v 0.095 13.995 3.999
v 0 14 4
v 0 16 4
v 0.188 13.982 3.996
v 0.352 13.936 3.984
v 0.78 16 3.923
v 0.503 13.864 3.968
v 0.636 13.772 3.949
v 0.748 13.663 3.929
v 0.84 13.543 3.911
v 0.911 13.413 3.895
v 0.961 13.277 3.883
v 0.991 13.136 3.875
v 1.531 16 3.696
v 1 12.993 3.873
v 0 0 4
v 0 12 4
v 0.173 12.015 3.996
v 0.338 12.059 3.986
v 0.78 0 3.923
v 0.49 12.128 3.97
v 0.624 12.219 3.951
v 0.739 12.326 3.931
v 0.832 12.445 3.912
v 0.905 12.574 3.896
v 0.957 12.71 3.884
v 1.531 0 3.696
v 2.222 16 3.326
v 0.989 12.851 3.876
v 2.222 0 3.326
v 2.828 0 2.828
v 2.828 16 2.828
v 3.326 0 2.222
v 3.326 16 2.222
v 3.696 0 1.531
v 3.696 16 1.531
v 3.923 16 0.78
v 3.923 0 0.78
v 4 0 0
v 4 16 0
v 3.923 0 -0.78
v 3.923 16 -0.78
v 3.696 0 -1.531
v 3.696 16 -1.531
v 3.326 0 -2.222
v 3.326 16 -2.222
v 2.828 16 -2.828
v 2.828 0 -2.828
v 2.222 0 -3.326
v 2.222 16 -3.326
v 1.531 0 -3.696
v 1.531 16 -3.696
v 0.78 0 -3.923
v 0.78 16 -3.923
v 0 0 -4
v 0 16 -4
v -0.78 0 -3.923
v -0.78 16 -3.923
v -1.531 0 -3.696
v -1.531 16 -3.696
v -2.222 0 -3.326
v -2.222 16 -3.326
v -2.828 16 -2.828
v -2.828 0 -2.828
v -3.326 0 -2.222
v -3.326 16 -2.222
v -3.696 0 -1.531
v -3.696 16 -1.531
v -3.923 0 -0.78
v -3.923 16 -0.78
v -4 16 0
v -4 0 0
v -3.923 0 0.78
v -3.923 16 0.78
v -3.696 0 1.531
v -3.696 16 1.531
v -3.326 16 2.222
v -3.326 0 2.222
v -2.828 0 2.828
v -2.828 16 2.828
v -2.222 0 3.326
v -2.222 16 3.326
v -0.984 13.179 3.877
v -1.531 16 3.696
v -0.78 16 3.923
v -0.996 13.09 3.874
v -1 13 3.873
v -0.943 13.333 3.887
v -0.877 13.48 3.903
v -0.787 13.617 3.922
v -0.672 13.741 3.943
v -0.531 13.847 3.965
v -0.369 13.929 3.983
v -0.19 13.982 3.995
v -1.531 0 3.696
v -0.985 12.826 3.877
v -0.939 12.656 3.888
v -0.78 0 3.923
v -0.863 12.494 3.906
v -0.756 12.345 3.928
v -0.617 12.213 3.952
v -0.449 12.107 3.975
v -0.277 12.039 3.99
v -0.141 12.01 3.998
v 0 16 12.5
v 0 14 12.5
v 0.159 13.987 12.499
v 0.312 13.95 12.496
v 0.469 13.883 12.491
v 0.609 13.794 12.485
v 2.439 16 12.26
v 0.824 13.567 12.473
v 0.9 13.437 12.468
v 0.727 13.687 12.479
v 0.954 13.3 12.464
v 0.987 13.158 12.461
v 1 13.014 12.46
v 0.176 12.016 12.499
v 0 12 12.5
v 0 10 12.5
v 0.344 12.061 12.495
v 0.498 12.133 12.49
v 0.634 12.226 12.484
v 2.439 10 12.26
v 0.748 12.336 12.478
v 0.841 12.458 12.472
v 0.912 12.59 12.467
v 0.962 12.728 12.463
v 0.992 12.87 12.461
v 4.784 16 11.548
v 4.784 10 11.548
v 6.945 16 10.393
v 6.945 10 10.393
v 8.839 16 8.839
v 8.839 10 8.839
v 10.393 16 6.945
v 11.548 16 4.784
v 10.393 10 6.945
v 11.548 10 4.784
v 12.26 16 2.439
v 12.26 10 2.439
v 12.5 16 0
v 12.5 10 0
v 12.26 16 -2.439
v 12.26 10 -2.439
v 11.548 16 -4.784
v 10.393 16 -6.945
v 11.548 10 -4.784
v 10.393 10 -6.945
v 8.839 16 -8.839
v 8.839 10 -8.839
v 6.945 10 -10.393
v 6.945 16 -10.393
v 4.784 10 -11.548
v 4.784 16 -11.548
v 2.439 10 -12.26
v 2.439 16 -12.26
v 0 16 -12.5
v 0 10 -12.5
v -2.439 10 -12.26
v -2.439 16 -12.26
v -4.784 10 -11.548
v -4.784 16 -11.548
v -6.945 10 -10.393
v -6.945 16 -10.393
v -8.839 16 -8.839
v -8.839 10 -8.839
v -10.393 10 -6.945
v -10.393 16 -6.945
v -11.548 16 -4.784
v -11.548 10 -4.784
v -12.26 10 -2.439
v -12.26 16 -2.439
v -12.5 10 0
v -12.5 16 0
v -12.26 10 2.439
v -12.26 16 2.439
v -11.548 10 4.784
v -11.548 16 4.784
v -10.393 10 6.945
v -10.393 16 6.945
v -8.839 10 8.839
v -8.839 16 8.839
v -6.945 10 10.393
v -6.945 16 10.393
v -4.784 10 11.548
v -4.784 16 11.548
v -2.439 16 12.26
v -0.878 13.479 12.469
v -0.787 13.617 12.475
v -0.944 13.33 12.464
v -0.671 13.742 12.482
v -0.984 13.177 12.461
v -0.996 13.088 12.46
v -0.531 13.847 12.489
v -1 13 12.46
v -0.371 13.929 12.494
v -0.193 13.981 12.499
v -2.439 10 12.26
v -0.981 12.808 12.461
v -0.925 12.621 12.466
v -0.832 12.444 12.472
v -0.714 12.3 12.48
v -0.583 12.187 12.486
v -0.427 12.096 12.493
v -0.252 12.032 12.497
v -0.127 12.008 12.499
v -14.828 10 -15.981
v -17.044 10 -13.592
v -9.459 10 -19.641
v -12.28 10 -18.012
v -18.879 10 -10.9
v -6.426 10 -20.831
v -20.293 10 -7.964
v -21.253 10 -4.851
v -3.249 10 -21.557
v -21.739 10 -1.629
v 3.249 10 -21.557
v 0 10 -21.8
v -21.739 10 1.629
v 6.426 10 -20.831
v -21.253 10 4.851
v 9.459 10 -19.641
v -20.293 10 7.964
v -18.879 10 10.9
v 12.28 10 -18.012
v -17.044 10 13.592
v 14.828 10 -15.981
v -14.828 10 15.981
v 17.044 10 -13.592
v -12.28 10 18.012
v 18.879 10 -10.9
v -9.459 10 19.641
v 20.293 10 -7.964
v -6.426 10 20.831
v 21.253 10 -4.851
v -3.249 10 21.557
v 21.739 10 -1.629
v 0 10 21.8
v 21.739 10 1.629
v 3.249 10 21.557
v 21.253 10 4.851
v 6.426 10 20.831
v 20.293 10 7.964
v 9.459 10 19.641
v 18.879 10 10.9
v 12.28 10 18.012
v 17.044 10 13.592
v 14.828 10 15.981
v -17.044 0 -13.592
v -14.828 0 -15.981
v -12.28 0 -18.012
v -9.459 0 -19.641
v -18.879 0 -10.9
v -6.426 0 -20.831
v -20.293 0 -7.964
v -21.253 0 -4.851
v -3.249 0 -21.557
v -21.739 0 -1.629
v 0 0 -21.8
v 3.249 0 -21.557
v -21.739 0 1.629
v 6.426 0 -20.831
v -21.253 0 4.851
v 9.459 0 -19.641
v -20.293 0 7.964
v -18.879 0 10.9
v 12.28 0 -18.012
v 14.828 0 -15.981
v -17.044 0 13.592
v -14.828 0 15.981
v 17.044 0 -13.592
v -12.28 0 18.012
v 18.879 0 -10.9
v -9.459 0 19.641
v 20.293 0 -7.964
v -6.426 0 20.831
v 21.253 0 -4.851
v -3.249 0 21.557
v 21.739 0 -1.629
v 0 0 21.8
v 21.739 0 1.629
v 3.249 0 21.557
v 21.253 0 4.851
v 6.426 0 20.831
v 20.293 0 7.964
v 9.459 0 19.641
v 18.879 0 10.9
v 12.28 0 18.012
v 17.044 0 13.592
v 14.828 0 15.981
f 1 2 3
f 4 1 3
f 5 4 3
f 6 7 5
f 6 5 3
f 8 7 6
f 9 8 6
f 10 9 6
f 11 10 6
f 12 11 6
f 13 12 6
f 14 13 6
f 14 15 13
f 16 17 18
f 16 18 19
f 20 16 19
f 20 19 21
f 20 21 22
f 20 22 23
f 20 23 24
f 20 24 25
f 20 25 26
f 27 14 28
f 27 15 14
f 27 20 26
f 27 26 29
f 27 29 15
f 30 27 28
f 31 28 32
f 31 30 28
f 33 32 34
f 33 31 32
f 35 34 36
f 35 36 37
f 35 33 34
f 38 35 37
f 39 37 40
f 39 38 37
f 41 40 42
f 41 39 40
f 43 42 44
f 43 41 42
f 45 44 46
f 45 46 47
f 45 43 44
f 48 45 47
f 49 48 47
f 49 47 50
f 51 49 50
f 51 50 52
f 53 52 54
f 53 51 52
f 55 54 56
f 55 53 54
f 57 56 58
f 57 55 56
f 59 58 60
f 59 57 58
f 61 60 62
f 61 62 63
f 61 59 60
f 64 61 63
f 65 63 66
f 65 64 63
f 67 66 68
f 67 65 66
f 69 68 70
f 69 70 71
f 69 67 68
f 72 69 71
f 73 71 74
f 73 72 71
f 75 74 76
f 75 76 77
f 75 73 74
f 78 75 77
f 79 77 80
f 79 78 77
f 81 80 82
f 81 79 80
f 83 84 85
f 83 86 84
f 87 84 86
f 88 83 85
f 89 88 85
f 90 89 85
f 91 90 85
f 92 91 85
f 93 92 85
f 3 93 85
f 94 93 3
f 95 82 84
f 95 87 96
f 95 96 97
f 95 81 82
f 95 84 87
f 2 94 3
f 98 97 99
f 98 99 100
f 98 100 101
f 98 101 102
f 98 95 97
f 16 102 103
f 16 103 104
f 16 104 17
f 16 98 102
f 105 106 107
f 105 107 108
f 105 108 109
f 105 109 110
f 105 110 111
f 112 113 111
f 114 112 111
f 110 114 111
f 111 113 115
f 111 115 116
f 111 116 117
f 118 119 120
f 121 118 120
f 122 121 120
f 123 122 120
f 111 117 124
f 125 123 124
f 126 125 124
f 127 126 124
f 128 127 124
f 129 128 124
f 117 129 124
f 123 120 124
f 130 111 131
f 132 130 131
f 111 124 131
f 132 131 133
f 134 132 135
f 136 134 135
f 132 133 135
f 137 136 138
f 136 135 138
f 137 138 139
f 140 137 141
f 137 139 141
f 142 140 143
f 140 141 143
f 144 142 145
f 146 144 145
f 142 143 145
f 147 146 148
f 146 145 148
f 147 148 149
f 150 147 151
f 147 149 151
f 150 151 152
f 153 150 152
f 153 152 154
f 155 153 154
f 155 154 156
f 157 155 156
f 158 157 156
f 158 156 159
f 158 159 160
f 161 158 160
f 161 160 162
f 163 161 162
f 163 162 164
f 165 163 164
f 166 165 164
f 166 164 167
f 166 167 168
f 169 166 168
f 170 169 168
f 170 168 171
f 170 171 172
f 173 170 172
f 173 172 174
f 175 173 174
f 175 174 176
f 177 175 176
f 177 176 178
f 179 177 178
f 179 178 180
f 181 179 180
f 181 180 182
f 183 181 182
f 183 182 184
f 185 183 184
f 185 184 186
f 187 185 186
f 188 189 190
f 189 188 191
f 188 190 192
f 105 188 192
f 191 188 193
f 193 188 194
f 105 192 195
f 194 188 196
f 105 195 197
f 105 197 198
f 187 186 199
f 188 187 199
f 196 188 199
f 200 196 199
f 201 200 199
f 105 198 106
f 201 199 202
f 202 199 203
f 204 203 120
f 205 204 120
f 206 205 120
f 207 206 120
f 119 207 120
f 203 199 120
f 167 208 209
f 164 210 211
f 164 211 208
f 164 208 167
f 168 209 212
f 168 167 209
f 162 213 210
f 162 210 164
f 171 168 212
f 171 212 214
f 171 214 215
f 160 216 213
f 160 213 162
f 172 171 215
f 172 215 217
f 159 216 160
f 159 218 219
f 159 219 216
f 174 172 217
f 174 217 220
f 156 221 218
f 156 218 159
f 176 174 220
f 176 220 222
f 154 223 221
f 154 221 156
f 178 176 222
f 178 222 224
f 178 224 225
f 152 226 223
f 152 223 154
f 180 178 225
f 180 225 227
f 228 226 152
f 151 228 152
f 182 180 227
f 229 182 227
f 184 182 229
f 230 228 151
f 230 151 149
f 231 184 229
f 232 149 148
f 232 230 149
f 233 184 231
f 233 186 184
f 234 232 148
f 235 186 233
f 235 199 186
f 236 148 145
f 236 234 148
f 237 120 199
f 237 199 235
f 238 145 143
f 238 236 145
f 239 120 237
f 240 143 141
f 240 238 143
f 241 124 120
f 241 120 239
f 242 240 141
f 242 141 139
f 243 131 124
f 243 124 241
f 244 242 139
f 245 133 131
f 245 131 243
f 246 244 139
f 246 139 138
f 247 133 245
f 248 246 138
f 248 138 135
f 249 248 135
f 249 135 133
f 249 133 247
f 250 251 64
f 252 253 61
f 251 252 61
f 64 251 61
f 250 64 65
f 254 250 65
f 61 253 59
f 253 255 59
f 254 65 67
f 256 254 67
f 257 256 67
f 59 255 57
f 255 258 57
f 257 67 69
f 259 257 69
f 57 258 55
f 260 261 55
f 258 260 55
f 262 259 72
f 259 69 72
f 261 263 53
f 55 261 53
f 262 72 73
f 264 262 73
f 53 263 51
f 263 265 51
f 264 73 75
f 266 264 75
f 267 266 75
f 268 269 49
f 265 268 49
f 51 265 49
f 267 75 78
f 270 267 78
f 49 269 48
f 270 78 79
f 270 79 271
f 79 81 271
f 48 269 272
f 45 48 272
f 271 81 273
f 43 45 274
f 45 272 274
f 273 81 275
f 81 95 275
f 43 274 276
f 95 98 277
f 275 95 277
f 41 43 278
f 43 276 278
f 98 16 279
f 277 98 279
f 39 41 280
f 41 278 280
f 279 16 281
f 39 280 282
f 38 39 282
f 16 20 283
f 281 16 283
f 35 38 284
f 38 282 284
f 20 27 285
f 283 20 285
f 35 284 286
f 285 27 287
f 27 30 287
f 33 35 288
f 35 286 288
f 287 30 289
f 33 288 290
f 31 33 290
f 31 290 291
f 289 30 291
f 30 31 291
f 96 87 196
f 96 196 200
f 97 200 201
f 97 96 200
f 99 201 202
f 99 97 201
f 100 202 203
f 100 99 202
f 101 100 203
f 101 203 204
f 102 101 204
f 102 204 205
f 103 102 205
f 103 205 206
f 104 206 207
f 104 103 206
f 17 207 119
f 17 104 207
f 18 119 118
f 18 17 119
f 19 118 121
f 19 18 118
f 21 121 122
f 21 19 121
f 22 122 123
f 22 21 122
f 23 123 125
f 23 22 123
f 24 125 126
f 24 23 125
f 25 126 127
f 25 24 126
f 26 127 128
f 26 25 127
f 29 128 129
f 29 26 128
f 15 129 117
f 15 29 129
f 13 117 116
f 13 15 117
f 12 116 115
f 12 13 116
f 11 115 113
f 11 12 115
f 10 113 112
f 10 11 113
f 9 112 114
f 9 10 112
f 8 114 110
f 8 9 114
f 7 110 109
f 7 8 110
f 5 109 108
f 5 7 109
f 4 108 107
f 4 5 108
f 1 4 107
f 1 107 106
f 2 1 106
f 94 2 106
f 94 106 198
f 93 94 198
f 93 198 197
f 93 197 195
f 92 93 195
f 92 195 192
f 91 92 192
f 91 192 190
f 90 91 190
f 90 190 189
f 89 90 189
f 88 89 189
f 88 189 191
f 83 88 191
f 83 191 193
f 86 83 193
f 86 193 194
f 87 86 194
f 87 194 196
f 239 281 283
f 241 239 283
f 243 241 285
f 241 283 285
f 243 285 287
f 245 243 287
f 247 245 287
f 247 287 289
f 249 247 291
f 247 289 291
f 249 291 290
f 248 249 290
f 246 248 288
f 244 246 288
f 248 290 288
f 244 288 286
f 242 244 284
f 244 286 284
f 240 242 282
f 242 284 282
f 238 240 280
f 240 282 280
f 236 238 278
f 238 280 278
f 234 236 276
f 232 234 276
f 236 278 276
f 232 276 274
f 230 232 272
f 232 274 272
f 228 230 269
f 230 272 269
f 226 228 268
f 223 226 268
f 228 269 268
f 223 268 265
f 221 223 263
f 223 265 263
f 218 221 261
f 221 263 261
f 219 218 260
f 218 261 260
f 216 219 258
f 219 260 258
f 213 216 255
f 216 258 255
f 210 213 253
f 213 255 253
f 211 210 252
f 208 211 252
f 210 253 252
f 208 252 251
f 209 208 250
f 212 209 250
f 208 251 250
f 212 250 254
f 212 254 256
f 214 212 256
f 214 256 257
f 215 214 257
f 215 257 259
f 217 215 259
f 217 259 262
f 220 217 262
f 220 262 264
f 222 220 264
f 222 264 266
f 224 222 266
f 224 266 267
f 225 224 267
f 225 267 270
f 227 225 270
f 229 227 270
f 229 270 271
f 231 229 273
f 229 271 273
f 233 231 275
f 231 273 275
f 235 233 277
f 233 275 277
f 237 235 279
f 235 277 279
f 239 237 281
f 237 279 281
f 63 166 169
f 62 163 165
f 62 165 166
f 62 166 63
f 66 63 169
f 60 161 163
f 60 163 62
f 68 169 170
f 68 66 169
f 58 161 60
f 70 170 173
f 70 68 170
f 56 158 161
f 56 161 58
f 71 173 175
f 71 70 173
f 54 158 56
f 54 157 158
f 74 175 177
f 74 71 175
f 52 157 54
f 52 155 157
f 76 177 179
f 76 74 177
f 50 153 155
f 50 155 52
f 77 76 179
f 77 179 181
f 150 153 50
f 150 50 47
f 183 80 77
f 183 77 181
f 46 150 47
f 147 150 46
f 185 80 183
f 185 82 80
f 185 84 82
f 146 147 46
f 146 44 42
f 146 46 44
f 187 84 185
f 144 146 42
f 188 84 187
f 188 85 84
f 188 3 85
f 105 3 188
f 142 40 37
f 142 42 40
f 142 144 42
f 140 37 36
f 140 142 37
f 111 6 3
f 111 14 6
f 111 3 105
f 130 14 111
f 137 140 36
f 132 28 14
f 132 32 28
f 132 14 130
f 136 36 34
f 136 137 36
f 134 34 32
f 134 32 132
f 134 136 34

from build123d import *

# Parameters (mm, degrees)
SKETCH_1_R               = 21.8
SKETCH_1_R_2             = 4
EXTRUDE_1_DEPTH          = 10
SKETCH_2_R               = 12.5
SKETCH_2_R_2             = 4
EXTRUDE_2_DEPTH          = 6
CUT_EXTRUDE_1_REACH      = 36.734
CUT_EXTRUDE_1_END_RADIUS = 12.5
SKETCH_3_R               = 1


with BuildPart() as part:
    # 草圖1 → 填料-伸長1 (new body)
    with BuildSketch(Plane(origin=(0, 0, 0), x_dir=(1, 0, 0), z_dir=(0, 1, 0))):
        with Locations(Location((0, 0, 0), (0, 0, 270))):
            Circle(SKETCH_1_R)
        with Locations(Location((0, 0, 0), (0, 0, 270))):
            Circle(SKETCH_1_R_2, mode=Mode.SUBTRACT)
    extrude(amount=EXTRUDE_1_DEPTH)

    # 草圖2 → 填料-伸長2 (add)
    with BuildSketch(Plane(origin=(0, 10, 0), x_dir=(1, 0, 0), z_dir=(0, 1, 0))):
        with Locations(Location((0, 0, 0), (0, 0, 270))):
            Circle(SKETCH_2_R)
        with Locations(Location((0, 0, 0), (0, 0, 270))):
            Circle(SKETCH_2_R_2, mode=Mode.SUBTRACT)
    extrude(amount=EXTRUDE_2_DEPTH)

    # 除料-伸長1: up to this cylinder (the profile starts inside it)
    cut_extrude_1_end = Plane(origin=(0, 13, 0), z_dir=(0, -1, 0)) * Cylinder(CUT_EXTRUDE_1_END_RADIUS, 99.468, mode=Mode.PRIVATE)
    # 草圖3 → 除料-伸長1 (cut, up to the surface)
    with BuildSketch(Plane.XY, mode=Mode.PRIVATE) as cut_extrude_1_sk1:
        with Locations(Location((0, 13, 0), (0, 0, 180))):
            Circle(SKETCH_3_R)
    cut_extrude_1_tool1 = extrude(cut_extrude_1_sk1.sketch, amount=CUT_EXTRUDE_1_REACH, mode=Mode.PRIVATE) & cut_extrude_1_end
    add(cut_extrude_1_tool1.solids().sort_by_distance((0, 13, 0))[0], mode=Mode.SUBTRACT)


solid = part.part
